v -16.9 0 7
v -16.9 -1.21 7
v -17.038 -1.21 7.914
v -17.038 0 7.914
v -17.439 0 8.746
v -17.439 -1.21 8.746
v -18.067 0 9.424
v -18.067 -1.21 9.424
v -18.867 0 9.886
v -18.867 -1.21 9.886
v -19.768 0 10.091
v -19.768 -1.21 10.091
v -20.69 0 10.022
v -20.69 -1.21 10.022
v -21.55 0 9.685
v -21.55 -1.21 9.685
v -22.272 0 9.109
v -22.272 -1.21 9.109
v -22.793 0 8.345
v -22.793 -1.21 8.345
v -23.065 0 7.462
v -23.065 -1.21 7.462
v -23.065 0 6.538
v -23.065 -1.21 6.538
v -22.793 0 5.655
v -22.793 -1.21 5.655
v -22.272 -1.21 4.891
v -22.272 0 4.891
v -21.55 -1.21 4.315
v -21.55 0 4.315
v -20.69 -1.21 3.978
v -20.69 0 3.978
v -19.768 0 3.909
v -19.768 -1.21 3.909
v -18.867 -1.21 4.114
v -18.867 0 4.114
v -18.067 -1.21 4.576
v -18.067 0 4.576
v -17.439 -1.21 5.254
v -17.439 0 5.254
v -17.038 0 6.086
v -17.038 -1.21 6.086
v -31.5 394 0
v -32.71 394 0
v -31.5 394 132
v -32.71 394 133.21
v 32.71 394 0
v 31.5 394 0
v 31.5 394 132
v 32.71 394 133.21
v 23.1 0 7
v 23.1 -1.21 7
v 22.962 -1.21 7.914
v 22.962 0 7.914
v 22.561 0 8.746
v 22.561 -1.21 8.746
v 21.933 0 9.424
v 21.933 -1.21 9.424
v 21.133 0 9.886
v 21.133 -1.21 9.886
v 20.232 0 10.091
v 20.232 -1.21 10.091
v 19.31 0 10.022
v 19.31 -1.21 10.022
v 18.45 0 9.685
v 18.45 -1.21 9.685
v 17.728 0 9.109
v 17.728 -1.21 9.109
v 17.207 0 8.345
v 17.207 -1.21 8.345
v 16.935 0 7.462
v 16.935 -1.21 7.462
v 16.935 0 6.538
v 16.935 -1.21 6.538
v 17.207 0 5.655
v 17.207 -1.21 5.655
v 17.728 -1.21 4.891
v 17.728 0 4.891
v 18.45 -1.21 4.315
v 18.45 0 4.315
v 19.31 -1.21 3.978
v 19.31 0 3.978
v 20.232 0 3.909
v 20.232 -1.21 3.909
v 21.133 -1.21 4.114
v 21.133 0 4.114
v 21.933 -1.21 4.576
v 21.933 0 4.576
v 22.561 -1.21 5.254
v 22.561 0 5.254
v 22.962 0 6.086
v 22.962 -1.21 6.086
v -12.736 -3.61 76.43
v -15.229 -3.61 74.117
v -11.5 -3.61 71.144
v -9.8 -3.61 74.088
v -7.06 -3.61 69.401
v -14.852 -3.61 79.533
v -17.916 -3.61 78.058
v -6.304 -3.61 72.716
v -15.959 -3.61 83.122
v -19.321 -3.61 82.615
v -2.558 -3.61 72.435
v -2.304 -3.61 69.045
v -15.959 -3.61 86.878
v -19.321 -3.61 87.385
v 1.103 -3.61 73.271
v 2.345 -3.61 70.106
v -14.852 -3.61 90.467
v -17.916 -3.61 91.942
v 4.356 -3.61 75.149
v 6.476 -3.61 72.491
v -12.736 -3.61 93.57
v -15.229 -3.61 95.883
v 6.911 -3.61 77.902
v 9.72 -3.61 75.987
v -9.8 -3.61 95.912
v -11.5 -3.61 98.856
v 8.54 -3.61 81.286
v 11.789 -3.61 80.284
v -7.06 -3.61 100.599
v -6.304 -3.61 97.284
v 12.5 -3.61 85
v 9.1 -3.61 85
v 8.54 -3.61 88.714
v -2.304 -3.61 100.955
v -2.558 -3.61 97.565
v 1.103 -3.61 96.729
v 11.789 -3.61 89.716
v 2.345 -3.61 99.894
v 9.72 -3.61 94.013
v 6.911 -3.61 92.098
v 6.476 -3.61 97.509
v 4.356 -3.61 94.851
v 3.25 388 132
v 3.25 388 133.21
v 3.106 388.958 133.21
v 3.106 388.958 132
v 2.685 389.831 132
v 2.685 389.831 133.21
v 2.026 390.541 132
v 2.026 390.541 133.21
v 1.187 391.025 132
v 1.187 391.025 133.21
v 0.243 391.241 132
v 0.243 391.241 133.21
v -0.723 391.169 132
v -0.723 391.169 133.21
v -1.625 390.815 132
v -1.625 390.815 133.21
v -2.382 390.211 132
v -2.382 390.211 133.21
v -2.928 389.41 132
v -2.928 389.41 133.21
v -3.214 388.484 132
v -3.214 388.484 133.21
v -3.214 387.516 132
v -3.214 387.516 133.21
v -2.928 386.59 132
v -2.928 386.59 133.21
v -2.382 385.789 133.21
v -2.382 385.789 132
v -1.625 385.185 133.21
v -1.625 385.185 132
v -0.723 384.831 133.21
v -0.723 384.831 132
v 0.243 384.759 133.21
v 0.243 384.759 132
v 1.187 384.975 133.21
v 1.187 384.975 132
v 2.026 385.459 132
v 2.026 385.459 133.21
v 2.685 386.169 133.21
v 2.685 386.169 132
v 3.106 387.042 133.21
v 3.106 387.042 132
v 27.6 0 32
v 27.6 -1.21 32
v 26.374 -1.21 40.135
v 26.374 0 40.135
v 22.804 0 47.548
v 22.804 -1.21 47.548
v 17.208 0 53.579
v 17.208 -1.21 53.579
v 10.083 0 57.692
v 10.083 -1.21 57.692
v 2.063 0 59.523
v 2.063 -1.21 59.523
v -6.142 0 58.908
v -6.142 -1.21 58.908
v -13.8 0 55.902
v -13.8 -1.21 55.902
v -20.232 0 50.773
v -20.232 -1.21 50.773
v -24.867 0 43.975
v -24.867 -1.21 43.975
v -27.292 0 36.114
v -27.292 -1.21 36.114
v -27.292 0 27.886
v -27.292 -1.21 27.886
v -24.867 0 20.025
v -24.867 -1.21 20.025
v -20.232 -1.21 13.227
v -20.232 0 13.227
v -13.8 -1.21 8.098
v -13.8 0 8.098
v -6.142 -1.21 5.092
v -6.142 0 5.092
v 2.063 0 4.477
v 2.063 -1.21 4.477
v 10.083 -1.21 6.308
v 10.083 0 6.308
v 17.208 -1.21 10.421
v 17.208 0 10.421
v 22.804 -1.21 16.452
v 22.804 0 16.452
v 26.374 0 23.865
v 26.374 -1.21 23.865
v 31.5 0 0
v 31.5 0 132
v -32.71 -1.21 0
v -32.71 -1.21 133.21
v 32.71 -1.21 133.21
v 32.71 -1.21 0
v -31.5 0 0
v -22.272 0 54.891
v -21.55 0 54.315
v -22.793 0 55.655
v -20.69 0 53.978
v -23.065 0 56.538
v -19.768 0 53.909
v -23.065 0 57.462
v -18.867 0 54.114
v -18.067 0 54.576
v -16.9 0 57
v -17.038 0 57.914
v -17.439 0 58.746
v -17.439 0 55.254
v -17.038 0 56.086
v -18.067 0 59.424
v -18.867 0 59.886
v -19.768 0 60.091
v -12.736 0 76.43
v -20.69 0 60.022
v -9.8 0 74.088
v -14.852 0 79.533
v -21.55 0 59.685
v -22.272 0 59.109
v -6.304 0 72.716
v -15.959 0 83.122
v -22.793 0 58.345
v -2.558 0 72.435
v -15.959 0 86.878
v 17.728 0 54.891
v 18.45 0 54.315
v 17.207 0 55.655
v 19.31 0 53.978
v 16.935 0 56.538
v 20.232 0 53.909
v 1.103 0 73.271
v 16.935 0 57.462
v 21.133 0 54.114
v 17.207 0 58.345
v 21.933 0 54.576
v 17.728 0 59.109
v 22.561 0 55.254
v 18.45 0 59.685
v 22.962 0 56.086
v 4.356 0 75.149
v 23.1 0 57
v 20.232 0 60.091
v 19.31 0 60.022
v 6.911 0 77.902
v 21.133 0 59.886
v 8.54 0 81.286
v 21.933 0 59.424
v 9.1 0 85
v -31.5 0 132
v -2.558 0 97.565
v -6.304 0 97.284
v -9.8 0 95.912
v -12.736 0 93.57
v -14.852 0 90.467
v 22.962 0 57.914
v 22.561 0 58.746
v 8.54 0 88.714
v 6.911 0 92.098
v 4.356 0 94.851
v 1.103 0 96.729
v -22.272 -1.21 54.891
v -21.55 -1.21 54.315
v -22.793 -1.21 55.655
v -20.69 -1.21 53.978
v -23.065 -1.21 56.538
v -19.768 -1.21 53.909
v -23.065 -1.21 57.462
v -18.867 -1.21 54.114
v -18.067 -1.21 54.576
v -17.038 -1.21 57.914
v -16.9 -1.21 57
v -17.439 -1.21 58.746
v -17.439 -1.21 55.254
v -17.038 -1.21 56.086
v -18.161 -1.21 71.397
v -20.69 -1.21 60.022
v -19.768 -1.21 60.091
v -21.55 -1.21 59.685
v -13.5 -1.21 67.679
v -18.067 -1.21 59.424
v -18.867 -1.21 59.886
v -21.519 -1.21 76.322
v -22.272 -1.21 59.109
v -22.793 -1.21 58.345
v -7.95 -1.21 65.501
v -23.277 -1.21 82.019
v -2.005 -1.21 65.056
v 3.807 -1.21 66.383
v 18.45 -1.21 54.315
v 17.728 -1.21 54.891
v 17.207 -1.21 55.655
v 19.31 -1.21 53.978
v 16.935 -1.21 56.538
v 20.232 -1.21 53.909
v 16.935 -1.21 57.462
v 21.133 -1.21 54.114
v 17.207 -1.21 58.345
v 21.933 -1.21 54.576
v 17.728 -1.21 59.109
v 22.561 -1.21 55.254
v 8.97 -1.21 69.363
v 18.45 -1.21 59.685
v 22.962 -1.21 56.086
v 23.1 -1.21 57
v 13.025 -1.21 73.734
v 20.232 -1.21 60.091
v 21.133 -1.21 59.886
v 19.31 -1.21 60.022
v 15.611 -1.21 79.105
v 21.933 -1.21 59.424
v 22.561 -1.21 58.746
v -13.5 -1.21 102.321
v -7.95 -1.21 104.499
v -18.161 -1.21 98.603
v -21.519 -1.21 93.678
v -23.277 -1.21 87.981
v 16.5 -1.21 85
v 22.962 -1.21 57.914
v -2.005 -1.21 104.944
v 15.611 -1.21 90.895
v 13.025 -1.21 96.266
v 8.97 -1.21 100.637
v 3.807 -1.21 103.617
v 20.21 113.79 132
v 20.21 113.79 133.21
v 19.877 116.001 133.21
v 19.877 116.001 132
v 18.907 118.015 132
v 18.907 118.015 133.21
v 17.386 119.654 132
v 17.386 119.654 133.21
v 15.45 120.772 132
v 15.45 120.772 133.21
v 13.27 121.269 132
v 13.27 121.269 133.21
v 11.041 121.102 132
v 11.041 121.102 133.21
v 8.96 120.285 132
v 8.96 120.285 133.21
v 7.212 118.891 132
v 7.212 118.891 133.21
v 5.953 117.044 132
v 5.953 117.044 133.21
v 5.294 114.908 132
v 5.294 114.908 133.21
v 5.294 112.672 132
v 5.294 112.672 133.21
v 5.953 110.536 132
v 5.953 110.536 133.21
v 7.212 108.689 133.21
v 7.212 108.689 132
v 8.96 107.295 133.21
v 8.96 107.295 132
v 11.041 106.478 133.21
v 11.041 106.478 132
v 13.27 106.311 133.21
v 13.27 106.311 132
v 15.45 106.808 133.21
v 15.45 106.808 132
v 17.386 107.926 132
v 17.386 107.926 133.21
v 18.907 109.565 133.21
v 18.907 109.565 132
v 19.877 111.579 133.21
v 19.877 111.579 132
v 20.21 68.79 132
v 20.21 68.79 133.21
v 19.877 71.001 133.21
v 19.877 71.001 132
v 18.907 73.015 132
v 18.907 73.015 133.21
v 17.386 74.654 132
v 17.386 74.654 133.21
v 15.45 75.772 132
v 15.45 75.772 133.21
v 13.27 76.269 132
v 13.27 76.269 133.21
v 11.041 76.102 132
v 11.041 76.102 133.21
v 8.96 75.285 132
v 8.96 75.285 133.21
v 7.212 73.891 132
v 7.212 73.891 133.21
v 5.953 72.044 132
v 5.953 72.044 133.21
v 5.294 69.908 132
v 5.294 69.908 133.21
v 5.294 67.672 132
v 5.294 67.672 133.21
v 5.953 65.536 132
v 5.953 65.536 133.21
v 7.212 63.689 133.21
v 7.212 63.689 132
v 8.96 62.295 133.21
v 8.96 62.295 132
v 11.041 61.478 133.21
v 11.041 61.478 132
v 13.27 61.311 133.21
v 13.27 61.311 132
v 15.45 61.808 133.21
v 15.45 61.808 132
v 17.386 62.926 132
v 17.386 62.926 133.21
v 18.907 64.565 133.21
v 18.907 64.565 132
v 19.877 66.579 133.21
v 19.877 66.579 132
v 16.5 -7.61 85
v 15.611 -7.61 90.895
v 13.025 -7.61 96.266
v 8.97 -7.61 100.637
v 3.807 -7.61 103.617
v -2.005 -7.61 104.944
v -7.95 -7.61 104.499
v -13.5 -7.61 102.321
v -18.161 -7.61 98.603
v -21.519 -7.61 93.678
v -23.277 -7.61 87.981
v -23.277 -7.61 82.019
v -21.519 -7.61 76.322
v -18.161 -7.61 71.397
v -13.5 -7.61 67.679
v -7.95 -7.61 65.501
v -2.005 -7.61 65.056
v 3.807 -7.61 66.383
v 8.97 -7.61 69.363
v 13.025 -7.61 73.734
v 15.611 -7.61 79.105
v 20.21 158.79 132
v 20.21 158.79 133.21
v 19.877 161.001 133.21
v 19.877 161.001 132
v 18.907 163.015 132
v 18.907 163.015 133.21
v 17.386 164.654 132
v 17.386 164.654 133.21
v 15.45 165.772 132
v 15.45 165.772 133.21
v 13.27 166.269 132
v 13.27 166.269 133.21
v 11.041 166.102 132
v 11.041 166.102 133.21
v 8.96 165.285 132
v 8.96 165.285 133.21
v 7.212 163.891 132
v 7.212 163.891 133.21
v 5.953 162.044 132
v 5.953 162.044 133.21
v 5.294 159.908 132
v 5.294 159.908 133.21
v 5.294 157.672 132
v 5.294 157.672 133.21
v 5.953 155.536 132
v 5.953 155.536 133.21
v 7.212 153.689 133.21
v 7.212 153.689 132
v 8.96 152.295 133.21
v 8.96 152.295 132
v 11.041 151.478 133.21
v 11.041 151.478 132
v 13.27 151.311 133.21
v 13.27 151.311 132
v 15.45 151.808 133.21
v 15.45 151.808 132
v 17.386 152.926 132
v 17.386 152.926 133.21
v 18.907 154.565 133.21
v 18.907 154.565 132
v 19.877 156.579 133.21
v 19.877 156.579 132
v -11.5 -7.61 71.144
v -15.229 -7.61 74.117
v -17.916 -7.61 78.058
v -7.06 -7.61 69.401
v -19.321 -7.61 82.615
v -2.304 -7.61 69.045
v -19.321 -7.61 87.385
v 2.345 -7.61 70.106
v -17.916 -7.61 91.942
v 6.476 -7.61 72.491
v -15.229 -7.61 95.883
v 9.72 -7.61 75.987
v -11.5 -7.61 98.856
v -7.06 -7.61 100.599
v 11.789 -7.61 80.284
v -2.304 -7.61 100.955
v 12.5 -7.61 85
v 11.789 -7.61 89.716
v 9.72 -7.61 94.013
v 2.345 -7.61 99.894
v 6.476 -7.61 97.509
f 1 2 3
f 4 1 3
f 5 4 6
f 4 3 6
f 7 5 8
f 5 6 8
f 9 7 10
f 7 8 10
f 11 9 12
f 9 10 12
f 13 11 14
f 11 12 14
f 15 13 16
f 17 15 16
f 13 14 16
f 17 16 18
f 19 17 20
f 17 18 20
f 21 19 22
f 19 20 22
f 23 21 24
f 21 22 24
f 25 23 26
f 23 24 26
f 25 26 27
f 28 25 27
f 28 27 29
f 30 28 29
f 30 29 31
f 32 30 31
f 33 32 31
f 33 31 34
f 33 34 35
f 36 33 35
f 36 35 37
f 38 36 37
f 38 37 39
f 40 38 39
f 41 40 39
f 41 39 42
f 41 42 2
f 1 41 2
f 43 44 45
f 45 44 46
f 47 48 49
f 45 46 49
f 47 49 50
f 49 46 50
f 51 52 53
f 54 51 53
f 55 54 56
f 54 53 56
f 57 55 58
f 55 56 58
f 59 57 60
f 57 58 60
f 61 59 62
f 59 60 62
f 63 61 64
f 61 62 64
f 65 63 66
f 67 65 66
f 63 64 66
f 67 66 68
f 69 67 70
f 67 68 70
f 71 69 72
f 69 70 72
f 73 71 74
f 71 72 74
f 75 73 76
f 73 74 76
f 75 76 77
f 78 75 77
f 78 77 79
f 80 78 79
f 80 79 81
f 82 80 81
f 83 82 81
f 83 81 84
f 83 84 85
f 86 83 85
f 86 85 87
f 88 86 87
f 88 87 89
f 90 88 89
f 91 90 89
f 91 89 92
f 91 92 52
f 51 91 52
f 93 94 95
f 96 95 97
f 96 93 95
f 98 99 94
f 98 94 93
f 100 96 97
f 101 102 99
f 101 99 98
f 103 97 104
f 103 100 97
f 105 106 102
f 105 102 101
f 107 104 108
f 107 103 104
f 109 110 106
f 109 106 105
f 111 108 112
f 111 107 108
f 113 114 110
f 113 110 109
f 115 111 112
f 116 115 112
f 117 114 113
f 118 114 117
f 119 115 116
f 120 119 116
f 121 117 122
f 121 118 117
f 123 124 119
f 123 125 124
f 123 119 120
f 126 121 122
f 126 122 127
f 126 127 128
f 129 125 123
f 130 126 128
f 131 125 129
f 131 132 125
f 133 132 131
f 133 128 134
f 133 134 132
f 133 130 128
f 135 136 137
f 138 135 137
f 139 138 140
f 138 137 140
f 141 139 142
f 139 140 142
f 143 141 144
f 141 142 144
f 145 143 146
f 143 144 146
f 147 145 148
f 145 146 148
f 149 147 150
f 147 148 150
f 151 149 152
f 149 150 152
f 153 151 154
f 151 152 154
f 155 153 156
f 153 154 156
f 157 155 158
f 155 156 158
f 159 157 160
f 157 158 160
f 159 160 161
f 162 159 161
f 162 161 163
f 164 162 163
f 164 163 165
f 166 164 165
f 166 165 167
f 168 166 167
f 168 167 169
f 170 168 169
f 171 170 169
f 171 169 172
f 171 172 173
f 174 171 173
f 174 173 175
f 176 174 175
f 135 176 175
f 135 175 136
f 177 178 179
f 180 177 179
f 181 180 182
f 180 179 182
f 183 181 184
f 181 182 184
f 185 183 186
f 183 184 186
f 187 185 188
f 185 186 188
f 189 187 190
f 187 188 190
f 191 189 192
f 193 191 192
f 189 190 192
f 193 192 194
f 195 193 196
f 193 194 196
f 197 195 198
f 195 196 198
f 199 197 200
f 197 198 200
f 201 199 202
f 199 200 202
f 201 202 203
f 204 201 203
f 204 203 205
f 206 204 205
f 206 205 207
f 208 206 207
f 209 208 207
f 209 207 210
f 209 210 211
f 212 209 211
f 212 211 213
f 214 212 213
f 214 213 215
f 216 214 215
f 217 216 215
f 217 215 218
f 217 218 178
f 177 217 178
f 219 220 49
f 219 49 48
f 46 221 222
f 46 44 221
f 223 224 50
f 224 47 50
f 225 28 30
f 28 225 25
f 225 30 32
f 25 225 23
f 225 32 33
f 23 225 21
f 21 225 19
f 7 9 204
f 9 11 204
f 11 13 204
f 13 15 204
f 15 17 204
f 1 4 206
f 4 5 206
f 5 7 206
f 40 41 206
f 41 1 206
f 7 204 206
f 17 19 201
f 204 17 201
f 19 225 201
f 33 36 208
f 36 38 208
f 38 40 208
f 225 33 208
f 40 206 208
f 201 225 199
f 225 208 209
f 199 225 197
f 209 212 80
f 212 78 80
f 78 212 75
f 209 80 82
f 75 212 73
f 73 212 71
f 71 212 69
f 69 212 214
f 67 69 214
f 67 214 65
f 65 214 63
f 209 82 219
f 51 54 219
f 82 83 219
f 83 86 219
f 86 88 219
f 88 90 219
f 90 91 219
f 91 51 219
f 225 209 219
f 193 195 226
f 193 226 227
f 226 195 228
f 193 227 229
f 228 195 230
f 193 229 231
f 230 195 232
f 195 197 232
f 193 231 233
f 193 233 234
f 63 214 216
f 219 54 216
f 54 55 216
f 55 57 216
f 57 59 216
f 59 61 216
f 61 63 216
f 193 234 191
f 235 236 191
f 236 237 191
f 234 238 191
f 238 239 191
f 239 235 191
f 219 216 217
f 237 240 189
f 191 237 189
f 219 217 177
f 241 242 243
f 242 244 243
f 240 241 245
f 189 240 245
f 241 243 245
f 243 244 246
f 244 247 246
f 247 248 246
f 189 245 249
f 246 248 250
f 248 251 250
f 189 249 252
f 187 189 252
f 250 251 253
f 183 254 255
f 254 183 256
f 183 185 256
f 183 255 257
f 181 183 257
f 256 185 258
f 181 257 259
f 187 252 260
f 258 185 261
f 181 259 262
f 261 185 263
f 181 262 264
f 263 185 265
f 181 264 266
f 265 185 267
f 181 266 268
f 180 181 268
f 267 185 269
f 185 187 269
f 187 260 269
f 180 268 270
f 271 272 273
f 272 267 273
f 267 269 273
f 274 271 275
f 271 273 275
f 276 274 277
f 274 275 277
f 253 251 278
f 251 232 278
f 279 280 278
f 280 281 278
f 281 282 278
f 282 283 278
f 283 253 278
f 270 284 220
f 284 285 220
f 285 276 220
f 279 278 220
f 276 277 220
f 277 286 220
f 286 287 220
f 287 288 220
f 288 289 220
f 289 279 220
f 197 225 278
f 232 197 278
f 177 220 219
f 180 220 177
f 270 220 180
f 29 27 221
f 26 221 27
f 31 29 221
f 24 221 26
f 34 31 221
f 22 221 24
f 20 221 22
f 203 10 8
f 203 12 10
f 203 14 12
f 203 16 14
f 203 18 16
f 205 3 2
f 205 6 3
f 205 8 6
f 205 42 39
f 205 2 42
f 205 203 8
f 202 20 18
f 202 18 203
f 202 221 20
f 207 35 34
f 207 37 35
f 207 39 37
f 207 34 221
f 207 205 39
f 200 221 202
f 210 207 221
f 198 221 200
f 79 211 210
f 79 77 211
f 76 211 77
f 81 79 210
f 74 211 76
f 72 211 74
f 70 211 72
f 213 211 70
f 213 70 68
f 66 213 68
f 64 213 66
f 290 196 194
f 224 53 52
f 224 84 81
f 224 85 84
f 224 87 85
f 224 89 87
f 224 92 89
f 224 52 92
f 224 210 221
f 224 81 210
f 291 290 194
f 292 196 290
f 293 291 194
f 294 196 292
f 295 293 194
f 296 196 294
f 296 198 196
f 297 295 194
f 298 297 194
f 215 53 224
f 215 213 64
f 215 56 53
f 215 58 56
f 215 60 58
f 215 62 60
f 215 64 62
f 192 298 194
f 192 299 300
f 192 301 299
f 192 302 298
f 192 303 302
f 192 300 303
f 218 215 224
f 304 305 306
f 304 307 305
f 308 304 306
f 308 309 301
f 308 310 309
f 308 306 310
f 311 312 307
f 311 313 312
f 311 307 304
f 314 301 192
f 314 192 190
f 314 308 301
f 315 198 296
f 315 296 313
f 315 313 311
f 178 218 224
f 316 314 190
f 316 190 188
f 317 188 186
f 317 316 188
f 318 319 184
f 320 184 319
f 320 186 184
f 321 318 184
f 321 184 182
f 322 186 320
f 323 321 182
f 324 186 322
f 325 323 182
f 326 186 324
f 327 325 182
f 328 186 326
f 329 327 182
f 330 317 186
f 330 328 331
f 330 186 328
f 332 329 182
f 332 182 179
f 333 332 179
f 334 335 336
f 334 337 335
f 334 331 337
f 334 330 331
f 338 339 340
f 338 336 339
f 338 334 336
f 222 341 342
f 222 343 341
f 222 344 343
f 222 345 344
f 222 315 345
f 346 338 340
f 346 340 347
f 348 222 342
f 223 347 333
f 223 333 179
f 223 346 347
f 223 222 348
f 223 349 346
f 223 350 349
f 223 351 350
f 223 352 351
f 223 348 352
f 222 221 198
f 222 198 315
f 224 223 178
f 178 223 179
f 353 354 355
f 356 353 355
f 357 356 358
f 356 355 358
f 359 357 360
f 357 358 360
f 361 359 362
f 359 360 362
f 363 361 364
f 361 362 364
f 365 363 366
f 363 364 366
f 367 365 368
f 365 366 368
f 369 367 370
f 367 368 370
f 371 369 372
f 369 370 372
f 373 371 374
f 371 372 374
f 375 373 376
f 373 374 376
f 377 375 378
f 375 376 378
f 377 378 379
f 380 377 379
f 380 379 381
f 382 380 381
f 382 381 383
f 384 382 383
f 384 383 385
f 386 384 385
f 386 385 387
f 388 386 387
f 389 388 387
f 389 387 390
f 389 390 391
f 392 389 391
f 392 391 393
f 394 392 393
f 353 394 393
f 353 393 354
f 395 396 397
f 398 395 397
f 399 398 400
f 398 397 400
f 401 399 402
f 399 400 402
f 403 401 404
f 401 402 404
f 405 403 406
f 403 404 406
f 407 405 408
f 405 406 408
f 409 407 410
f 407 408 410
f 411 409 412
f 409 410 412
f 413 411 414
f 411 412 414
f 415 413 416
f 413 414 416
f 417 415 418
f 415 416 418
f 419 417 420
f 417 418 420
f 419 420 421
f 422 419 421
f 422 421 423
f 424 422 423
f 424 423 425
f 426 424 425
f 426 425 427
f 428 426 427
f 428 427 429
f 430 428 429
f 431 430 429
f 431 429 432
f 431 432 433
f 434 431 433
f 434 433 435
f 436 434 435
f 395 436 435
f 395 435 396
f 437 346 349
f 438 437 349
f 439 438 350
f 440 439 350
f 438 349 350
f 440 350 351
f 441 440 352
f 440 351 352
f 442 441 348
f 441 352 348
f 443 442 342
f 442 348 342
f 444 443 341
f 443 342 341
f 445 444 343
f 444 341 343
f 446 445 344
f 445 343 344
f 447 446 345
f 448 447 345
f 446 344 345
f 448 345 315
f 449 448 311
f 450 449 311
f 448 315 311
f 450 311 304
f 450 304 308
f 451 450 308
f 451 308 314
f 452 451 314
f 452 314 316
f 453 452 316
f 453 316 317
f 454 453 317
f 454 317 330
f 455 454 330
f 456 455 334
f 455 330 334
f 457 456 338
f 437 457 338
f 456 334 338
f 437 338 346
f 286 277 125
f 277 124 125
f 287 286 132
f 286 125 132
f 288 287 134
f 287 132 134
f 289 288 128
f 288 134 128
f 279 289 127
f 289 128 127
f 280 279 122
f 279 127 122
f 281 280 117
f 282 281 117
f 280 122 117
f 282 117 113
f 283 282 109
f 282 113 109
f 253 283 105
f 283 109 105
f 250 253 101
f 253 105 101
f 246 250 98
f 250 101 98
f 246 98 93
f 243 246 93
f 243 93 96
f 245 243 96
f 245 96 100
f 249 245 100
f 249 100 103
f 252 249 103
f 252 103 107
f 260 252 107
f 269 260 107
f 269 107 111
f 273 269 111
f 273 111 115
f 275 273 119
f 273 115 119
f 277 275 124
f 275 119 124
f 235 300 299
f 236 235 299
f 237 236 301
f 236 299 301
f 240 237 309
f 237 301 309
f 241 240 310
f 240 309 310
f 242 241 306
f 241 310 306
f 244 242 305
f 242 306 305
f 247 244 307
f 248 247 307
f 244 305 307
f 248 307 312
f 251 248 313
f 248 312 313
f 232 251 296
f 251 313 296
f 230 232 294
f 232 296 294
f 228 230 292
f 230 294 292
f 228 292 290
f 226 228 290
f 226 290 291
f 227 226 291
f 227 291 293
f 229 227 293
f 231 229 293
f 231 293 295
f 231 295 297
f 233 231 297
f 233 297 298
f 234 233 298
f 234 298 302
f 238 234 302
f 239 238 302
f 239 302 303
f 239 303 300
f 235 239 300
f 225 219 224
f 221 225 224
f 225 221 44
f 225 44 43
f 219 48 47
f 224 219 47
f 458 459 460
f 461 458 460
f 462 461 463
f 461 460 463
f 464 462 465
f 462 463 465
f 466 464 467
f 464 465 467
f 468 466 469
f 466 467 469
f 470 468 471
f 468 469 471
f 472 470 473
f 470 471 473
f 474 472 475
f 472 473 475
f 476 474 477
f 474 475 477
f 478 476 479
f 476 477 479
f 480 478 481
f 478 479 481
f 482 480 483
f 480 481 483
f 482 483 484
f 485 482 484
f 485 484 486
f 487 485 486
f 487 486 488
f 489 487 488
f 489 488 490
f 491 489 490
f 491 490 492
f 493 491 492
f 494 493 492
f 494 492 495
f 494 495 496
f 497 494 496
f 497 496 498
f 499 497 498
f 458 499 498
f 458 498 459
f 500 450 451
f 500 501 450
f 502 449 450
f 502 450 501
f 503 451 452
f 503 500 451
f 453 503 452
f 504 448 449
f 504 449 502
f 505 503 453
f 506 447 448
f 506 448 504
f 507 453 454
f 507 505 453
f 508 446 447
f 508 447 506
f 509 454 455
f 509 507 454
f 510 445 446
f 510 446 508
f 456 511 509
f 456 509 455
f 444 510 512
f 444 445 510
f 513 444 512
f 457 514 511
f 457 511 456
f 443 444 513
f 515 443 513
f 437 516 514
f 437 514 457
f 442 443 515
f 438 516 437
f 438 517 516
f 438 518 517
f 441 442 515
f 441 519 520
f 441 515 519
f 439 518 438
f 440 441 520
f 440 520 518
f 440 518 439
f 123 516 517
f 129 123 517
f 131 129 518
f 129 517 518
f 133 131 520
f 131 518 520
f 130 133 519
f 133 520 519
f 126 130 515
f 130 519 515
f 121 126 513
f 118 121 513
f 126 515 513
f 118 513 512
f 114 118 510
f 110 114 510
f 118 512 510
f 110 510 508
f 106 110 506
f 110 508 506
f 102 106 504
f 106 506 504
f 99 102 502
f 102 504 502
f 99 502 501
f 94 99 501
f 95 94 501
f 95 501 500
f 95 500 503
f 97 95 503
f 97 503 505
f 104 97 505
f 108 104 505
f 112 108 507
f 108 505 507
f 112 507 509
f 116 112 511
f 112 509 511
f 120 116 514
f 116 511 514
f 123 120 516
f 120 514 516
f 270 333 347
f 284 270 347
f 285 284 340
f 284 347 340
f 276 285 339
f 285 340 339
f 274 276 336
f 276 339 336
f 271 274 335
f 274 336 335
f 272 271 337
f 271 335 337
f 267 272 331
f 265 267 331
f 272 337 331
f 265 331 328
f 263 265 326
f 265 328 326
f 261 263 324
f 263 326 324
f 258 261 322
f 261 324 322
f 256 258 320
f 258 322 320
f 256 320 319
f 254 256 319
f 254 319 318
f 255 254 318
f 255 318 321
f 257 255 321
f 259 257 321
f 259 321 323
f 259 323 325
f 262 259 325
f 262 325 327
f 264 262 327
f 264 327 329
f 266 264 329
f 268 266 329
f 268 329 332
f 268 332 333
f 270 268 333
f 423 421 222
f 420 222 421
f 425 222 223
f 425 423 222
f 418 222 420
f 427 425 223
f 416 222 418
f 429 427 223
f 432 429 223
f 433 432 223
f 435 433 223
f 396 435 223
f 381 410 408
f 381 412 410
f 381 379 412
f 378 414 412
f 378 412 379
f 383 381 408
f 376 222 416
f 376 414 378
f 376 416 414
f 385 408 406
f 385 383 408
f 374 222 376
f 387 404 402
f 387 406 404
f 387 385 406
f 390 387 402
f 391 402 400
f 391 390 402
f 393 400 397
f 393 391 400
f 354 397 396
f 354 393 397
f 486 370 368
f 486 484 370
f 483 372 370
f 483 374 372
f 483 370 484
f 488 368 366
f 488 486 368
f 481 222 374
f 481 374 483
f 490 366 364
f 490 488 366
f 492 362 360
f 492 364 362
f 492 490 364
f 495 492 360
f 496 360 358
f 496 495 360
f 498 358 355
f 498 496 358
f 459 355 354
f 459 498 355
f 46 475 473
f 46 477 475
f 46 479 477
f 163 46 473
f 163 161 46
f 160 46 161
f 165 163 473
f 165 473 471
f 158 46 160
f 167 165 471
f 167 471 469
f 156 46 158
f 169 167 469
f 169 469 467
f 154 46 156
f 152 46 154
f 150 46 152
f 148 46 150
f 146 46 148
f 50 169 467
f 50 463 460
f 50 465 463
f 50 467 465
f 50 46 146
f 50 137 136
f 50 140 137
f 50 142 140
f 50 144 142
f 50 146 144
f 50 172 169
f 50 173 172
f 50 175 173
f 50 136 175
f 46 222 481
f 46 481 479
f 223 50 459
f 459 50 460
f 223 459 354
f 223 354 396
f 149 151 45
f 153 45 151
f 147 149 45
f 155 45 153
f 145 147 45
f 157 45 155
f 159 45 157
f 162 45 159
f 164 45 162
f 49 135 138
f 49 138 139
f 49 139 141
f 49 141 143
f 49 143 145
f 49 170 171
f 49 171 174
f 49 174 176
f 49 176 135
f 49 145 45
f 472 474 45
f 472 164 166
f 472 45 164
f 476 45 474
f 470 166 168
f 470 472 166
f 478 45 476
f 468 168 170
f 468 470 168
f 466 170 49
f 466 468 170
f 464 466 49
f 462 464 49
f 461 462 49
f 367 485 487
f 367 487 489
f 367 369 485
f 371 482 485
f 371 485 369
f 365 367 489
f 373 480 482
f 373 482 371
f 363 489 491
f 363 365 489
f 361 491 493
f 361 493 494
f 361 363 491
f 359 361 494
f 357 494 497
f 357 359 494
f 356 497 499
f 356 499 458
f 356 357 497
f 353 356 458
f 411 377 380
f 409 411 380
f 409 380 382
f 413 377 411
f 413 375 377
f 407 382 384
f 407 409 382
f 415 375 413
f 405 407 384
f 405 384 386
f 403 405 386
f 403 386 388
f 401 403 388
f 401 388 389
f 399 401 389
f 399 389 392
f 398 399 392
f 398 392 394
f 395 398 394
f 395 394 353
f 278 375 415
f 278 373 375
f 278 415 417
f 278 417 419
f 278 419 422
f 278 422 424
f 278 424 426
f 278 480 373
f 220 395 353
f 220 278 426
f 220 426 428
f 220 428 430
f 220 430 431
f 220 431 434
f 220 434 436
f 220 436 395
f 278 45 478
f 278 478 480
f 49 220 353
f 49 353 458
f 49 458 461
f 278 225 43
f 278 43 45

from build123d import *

# Parameters (mm, degrees)
F1_DEPTH      = 394
F2_W          = 65.42
F2_H          = 133.21
F3_DEPTH      = 1.21
F4_R          = 27.6
F5_DEPTH      = 395.211
F6_R          = 12.6
F7_DEPTH      = 395.211
F7_DEPTH_BACK = 628
F8_R          = 20
F8_R_2        = 12.6
F9_DEPTH      = 6.4
F11_R         = 7.5
F12_DEPTH     = 133.211
F13_R         = 3.25
F14_DEPTH     = 25
F10_R         = 16
F15_DEPTH     = 4
F16_R         = 3.1
F17_DEPTH     = 395.211


# Not quite as in the source:
# - an extrude ends at something that could not be found from the text; its depth is read off the source's solid


with BuildPart() as f1:
    # F0 (on Front) → F1 (new body)
    with BuildSketch(Plane.XZ):
        Polygon((-31.5, 132), (0, 132), (31.5, 132), (31.5, 0), (32.71, 0), (32.71, 133.21), (0, 133.21), (-32.71, 133.21), (-32.71, 0), (-31.5, 0), align=None)
    extrude(amount=-F1_DEPTH)

    # F2 (on face) → F3 (join)
    with BuildSketch(Plane.XZ):
        with Locations((0, 66.605)):
            Rectangle(F2_W, F2_H)
    extrude(amount=F3_DEPTH)

    # F4 (on face) → F5 (cut, through all)
    with BuildSketch(Plane.XZ.offset(1.21)):
        with Locations((0, 32)):
            Circle(F4_R)
    extrude(amount=-F5_DEPTH, mode=Mode.SUBTRACT)

    # F6 (on face) → F7 (cut, two sides)
    with BuildSketch(Plane.XZ.offset(1.21)) as f7_sk:
        with Locations((-3.5, 85)):
            Circle(F6_R)
    extrude(amount=-F7_DEPTH, mode=Mode.SUBTRACT)
    extrude(f7_sk.sketch, amount=F7_DEPTH_BACK, mode=Mode.SUBTRACT)

    # F8 (on face) → F9 (join)
    with BuildSketch(Plane.XZ.offset(1.21)):
        with Locations((-3.5, 85)):
            Circle(F8_R)
        with Locations((-3.5, 85)):
            Circle(F8_R_2, mode=Mode.SUBTRACT)
    extrude(amount=F9_DEPTH)

    # F11 (on face) → F12 (cut, through all)
    with BuildSketch(Plane.XY.offset(133.21)):
        with Locations((12.71, 68.79)):
            Circle(F11_R)
        with Locations((12.71, 113.79)):
            Circle(F11_R)
        with Locations((12.71, 158.79)):
            Circle(F11_R)
    extrude(amount=-F12_DEPTH, mode=Mode.SUBTRACT)

    # F13 (on face) → F14 (cut)
    with BuildSketch(Plane.XY.offset(133.21)):
        with Locations((0, 388)):
            Circle(F13_R)
    extrude(amount=-F14_DEPTH, mode=Mode.SUBTRACT)

    # F10 (on face) → F15 (cut)
    with BuildSketch(Plane.XZ.offset(7.61)):
        with Locations((-3.5, 85)):
            Circle(F10_R)
    extrude(amount=-F15_DEPTH, mode=Mode.SUBTRACT)

    # F16 (on face) → F17 (cut, through all)
    with BuildSketch(Plane.XZ.offset(1.21)):
        with Locations((20, 57)):
            Circle(F16_R)
        with Locations((-20, 57)):
            Circle(F16_R)
        with Locations((-20, 7)):
            Circle(F16_R)
        with Locations((20, 7)):
            Circle(F16_R)
    extrude(amount=-F17_DEPTH, mode=Mode.SUBTRACT)


solid = f1.part
